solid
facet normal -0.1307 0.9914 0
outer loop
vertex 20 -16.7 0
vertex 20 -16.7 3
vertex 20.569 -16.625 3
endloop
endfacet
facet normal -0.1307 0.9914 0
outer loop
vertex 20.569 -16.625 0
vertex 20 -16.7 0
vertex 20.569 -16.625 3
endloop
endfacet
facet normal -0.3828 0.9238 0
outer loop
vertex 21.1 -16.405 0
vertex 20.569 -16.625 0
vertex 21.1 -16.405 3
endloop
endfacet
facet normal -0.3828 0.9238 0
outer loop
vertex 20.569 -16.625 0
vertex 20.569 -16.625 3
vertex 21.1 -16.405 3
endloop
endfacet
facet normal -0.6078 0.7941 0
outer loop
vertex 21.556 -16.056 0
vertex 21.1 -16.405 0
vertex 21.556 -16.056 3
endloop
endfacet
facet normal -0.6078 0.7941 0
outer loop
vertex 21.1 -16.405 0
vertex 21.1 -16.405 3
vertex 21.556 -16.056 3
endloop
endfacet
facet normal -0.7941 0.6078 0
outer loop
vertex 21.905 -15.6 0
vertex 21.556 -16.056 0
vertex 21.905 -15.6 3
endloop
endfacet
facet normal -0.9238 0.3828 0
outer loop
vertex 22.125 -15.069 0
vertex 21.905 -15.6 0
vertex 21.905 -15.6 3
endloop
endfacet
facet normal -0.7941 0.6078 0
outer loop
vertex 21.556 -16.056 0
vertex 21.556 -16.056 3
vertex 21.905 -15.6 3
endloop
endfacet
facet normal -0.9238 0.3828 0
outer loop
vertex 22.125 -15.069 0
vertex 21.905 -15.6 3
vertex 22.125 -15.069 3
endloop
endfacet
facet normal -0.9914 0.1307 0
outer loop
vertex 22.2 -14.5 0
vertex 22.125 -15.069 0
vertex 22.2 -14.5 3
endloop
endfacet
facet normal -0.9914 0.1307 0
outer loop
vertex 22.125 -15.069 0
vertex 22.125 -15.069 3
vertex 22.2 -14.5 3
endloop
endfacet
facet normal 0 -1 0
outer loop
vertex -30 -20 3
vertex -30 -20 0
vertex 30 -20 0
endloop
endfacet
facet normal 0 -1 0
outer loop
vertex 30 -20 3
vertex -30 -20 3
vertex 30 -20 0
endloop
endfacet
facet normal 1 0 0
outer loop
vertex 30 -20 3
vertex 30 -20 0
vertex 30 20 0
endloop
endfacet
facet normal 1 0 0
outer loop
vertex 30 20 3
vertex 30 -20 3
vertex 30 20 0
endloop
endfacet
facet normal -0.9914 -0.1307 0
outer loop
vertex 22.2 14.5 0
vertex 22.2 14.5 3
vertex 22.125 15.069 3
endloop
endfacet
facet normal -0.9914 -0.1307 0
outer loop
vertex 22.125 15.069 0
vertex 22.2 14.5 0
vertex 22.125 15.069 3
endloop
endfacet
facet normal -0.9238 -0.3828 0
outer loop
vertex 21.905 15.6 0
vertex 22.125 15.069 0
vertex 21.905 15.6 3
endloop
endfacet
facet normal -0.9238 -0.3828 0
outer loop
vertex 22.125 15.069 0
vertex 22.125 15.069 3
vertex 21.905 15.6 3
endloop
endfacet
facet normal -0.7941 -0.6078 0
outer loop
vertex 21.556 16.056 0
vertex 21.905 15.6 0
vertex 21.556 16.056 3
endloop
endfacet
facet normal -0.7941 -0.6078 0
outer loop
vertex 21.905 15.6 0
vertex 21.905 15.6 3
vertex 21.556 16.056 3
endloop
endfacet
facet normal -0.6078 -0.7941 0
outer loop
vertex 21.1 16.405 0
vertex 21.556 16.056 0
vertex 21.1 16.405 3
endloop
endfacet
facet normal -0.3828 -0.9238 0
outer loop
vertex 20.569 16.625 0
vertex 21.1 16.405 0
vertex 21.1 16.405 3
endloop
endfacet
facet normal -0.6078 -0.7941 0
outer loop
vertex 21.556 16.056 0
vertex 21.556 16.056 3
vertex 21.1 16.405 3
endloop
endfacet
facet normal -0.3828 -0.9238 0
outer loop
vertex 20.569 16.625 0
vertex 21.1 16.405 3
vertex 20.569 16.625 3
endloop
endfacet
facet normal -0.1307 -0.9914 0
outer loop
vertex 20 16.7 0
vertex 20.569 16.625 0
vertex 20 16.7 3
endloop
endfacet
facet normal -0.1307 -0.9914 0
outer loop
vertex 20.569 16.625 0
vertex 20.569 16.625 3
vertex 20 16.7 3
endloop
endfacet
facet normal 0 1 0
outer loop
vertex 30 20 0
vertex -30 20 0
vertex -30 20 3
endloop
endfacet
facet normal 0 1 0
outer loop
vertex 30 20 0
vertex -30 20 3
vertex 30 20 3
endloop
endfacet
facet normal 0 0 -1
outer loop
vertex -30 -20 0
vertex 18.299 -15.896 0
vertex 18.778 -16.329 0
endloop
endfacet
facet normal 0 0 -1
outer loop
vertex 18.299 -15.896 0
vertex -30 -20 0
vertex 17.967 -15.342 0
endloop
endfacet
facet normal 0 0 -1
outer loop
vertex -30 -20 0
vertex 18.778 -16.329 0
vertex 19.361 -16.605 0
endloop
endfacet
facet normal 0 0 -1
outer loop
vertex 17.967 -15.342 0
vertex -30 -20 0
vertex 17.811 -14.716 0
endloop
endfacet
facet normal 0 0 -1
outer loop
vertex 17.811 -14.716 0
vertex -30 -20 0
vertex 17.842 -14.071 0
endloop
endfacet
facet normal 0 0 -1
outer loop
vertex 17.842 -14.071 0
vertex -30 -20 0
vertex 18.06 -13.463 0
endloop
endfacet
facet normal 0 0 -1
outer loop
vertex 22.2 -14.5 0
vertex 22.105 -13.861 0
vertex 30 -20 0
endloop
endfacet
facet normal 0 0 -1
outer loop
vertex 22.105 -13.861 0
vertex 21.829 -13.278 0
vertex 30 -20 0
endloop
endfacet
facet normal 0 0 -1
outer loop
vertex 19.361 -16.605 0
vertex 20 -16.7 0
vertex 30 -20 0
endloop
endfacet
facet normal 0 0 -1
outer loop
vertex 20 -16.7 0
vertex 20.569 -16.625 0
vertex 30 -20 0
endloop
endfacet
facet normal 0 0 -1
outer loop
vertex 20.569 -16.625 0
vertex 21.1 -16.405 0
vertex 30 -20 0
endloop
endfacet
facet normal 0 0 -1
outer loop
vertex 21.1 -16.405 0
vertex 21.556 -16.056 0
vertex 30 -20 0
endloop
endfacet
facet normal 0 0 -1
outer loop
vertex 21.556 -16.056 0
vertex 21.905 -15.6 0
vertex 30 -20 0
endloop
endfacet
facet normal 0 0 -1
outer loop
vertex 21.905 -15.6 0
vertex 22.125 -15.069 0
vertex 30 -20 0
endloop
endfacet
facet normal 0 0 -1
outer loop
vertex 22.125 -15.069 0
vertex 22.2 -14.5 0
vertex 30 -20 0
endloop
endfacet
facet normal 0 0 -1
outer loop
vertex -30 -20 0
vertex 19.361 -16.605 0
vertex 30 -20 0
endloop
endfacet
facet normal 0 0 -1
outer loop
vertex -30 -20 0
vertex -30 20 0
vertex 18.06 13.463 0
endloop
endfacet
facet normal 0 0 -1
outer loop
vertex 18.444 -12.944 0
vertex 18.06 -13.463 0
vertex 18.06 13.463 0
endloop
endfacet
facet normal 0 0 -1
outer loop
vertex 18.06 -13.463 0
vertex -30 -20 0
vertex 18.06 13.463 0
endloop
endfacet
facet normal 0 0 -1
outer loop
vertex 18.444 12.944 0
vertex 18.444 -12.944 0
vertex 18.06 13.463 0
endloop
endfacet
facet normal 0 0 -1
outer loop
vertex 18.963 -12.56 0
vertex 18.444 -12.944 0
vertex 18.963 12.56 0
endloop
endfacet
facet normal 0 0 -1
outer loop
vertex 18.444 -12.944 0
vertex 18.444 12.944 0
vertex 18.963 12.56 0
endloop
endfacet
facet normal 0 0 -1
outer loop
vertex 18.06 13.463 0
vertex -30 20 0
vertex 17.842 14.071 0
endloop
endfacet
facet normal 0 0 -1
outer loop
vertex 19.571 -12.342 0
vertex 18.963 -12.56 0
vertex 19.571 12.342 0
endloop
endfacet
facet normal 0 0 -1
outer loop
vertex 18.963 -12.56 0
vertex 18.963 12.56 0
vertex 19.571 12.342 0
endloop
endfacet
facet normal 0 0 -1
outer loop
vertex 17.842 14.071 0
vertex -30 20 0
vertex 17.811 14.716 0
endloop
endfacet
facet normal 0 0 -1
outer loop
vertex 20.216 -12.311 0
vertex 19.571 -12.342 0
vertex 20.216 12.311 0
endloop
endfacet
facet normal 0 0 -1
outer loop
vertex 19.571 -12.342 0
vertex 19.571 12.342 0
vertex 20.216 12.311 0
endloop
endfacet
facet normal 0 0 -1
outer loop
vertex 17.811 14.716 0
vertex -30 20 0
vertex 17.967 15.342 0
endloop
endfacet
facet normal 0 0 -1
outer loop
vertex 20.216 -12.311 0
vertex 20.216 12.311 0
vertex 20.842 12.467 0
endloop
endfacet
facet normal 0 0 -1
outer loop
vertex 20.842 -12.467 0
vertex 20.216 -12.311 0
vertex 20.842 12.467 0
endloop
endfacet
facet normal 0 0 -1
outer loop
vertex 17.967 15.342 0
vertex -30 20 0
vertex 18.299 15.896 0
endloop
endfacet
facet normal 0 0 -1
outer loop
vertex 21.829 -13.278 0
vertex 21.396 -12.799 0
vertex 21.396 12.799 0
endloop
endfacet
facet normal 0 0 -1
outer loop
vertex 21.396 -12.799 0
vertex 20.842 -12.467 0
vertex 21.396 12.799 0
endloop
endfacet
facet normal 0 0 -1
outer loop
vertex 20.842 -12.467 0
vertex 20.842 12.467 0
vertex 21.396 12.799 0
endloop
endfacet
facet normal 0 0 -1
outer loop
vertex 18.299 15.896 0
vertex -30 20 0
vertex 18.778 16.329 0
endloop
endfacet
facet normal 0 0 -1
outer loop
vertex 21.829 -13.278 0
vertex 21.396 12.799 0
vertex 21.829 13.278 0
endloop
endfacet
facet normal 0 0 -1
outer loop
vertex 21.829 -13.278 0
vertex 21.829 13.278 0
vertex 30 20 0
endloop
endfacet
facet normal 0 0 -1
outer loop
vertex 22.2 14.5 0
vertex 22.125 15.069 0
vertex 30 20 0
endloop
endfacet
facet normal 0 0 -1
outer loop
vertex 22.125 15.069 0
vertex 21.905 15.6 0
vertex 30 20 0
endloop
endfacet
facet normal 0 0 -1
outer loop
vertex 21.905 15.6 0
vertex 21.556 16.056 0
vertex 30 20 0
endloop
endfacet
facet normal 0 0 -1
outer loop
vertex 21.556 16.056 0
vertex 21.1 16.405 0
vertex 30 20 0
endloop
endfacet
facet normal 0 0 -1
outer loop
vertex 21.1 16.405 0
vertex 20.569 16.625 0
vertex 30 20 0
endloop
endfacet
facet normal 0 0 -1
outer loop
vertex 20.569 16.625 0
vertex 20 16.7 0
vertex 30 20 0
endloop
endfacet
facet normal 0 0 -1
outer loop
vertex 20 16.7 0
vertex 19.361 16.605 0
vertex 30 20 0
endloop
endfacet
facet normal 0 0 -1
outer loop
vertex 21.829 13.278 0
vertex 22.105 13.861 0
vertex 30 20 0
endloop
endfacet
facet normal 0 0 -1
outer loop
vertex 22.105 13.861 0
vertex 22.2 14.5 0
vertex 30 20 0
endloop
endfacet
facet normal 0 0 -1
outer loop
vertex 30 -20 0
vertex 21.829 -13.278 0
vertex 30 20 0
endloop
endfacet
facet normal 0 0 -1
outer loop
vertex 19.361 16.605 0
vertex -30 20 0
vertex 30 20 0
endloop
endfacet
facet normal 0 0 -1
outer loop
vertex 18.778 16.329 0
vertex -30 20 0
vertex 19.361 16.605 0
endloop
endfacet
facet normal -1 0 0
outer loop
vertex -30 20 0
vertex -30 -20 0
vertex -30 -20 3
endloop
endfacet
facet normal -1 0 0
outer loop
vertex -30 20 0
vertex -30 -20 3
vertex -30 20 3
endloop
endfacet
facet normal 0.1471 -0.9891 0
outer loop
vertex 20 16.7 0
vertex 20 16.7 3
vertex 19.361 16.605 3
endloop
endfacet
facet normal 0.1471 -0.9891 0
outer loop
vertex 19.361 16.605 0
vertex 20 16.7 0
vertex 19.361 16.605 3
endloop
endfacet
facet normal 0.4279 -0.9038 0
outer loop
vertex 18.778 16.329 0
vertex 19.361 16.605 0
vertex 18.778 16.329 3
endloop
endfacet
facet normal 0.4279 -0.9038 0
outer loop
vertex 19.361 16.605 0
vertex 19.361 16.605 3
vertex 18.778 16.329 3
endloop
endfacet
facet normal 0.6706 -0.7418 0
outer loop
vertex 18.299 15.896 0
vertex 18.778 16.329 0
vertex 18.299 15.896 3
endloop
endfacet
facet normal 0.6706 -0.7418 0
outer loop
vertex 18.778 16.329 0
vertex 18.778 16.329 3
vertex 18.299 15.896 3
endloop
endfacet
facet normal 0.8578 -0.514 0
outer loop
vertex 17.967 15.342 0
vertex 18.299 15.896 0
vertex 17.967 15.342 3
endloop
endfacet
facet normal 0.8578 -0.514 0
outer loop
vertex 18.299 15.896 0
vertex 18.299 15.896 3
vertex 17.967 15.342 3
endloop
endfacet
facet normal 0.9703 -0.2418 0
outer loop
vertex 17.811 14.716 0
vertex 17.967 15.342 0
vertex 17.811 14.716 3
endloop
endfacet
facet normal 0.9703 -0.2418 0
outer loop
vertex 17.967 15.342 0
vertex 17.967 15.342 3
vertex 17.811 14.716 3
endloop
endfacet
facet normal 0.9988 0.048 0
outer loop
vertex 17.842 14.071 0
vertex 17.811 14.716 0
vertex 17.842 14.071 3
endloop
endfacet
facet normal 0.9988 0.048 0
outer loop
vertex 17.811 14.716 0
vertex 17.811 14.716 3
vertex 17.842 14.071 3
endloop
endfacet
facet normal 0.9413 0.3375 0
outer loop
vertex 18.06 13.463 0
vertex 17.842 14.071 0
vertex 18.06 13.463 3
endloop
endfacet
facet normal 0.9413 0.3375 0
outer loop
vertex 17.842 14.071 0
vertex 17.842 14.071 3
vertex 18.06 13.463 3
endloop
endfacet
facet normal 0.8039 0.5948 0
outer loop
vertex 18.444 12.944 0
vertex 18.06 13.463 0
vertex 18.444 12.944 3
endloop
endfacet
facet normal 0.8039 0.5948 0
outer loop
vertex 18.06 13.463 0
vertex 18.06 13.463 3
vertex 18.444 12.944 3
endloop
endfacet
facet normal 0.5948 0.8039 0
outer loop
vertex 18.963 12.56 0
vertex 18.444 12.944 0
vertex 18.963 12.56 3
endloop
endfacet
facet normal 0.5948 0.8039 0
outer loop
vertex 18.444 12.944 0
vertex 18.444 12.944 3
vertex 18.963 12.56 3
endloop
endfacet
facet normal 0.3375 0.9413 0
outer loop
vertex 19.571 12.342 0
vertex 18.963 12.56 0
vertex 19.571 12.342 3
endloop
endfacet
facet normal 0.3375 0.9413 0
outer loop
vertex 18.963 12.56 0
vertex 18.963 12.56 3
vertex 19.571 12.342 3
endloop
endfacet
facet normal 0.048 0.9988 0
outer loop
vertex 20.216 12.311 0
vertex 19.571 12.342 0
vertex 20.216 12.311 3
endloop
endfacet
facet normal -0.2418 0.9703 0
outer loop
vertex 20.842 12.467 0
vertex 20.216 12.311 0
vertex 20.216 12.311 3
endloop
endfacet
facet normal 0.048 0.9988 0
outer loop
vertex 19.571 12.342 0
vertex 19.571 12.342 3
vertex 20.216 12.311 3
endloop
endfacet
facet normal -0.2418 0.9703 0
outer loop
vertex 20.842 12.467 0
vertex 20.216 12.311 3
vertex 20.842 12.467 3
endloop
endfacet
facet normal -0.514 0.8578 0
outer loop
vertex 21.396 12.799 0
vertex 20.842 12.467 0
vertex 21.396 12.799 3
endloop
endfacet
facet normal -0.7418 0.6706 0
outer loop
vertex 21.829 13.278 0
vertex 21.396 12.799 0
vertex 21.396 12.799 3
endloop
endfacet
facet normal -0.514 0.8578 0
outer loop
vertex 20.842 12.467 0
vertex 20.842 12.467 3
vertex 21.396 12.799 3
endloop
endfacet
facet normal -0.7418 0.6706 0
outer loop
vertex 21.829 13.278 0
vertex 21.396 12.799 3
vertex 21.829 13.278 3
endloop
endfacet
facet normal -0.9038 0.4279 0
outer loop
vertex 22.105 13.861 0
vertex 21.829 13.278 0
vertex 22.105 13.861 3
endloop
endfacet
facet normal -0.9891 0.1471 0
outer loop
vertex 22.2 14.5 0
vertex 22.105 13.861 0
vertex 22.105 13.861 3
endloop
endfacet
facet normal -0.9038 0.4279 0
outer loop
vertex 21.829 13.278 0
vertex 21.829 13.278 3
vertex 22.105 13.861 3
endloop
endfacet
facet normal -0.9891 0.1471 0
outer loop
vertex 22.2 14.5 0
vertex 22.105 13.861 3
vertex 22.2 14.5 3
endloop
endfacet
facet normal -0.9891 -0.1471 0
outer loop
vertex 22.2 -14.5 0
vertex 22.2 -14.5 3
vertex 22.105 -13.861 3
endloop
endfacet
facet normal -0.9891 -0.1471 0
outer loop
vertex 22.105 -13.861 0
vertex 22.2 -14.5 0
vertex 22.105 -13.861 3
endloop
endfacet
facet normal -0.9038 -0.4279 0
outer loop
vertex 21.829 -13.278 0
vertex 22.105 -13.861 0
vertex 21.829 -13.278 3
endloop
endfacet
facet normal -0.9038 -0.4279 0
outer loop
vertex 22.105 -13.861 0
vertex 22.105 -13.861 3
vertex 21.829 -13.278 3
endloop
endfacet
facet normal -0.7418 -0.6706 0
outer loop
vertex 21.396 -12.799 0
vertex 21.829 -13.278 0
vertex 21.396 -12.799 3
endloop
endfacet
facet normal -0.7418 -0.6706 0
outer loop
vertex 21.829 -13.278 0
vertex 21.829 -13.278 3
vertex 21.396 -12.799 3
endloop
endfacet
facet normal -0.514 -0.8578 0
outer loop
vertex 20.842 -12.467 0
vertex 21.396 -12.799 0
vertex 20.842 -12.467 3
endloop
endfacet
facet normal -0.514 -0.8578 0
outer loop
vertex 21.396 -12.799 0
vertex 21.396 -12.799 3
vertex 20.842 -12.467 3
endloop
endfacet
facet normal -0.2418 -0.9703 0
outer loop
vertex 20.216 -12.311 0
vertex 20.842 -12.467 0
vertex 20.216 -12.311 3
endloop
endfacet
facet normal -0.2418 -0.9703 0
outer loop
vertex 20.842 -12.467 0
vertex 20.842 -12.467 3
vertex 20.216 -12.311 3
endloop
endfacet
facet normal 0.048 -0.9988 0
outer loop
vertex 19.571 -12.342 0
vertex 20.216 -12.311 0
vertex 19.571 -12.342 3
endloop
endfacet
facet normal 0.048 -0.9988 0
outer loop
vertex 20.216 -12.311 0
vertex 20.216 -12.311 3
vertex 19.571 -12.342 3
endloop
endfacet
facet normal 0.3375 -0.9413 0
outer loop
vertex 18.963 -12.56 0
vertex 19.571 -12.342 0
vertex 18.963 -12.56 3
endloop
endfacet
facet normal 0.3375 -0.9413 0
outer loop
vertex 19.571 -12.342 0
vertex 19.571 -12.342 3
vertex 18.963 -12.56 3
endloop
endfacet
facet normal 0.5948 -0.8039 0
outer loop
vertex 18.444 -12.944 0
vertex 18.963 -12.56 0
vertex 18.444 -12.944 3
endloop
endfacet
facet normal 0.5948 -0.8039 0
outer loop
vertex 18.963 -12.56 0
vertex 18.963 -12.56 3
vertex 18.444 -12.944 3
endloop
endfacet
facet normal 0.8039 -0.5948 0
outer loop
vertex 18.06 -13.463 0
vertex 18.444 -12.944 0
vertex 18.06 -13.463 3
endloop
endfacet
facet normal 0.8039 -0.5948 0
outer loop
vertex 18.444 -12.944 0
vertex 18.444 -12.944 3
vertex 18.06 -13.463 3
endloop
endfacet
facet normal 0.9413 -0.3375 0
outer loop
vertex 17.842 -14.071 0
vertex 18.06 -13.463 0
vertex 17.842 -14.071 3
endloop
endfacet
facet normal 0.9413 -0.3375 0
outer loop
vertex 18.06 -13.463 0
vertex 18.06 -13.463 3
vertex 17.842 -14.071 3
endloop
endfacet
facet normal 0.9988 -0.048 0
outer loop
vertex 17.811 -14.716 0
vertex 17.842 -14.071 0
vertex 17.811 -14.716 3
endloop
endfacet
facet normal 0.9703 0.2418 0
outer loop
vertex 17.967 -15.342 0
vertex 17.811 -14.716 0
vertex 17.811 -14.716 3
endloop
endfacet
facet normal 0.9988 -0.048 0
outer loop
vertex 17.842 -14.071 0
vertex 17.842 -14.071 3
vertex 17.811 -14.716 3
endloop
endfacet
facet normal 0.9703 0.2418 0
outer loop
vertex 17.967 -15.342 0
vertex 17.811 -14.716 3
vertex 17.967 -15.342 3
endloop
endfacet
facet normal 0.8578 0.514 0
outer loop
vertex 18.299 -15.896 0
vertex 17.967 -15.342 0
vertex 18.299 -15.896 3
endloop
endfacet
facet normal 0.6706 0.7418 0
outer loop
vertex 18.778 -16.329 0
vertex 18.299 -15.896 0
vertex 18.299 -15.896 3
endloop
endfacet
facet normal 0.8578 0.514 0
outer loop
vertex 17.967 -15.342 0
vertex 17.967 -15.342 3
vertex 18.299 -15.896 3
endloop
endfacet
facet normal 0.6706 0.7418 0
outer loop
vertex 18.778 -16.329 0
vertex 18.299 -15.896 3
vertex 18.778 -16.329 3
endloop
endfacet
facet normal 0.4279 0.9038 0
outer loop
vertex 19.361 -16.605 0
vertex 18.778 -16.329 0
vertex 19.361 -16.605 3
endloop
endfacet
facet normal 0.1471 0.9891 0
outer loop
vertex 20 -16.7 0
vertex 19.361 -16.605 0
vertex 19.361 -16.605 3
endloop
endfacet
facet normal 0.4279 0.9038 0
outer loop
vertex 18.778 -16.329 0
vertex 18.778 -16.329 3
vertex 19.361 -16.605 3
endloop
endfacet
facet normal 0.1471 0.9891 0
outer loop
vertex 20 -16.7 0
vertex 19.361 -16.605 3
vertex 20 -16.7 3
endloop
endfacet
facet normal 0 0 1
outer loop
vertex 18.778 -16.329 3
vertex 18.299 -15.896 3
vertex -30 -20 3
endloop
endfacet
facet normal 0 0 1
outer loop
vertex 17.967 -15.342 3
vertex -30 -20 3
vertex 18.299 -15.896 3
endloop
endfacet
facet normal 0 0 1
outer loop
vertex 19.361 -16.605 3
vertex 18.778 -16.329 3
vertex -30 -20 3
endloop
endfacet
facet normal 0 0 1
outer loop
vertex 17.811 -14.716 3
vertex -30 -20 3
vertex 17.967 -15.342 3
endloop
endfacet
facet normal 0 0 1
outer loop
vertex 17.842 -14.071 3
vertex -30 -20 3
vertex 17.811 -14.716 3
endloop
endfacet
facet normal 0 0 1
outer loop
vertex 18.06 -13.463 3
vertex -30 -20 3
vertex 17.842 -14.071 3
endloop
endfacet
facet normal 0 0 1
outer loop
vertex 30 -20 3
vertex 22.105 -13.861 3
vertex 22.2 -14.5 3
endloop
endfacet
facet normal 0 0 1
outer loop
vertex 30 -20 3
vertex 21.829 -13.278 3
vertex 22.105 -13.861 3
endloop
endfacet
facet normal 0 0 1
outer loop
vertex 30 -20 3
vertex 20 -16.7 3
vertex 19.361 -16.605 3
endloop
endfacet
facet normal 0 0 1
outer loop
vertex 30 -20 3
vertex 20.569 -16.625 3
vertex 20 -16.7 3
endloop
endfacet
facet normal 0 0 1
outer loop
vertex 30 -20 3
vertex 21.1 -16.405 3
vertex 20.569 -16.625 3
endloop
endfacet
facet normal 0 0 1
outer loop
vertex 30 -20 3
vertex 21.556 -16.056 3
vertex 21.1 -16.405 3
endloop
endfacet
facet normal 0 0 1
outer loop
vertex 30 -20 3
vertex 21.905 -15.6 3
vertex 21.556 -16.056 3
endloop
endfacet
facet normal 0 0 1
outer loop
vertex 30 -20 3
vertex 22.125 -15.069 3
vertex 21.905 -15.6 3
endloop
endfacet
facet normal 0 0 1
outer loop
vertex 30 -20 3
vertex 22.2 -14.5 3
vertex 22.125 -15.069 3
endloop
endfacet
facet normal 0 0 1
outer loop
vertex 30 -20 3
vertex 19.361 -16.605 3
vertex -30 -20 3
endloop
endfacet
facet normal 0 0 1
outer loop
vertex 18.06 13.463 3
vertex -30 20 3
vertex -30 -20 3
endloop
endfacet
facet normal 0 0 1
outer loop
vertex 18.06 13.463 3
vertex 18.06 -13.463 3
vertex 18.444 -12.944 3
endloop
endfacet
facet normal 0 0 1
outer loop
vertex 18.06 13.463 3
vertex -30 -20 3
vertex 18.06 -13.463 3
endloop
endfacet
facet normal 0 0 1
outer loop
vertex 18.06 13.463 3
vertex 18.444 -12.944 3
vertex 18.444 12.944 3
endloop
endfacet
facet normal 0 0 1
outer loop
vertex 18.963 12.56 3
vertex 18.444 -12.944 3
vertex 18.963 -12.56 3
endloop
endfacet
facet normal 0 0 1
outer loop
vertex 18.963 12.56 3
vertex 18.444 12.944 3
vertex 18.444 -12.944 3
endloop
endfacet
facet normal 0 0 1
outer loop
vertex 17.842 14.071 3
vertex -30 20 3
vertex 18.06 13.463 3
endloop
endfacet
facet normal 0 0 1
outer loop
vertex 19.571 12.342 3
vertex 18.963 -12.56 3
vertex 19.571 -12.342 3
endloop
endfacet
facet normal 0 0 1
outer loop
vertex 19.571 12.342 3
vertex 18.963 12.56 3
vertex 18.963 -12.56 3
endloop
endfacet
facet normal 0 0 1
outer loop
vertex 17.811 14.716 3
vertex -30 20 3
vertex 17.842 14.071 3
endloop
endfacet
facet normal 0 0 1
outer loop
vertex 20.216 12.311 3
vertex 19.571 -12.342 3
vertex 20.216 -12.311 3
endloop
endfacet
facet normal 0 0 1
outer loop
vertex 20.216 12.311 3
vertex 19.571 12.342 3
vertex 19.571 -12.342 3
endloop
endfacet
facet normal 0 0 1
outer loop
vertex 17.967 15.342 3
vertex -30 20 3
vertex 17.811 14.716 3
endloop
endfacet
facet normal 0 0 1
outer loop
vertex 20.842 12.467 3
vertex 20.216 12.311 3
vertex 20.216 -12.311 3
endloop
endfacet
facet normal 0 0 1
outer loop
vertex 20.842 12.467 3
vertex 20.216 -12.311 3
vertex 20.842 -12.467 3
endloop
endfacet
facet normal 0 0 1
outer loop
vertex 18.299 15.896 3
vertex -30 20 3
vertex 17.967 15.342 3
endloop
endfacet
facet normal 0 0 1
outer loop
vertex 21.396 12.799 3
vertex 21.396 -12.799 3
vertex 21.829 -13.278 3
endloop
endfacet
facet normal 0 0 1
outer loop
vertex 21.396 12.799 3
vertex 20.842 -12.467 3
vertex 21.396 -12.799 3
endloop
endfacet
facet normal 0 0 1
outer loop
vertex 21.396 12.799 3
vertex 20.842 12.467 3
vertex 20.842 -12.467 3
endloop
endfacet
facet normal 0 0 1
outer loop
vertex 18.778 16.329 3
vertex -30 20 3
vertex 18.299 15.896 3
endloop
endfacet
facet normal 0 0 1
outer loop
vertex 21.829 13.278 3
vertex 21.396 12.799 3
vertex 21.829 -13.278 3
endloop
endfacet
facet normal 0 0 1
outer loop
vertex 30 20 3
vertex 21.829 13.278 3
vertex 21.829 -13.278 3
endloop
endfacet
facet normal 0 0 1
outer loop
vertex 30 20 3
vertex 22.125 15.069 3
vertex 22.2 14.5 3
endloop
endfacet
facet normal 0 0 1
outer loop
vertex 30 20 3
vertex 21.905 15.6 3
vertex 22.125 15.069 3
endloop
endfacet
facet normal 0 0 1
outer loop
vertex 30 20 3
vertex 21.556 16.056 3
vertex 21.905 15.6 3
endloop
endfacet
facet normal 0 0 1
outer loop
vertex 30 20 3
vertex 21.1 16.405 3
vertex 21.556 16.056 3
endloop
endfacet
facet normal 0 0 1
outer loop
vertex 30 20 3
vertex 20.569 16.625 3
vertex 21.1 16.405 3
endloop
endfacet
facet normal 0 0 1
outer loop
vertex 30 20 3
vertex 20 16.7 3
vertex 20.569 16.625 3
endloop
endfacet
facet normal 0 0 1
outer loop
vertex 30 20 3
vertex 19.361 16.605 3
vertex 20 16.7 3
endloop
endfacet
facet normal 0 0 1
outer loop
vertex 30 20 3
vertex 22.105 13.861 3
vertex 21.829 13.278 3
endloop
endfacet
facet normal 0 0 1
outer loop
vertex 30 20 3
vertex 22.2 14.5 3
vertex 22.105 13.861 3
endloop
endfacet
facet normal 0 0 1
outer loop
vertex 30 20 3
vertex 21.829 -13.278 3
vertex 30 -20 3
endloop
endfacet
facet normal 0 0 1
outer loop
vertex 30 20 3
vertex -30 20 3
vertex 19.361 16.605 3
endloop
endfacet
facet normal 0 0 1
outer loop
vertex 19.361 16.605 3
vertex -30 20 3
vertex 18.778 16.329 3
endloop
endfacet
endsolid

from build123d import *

# Parameters (mm, degrees)
SKETCH_1_W          = 60
SKETCH_1_H          = 40
EXTRUDE_1_DEPTH     = 3
CUT_EXTRUDE_1_DEPTH = 3


with BuildPart() as part:
    # ｽｹｯﾁ1 → ﾎﾞｽ - 押し出し1 (new body)
    with BuildSketch(Plane.XY):
        Rectangle(SKETCH_1_W, SKETCH_1_H)
    extrude(amount=EXTRUDE_1_DEPTH)

    # ｽｹｯﾁ2 → ｶｯﾄ - 押し出し1 (cut)
    with BuildSketch(Plane.XY.offset(3)):
        with BuildLine():
            ThreePointArc((22.2, 14.5), (21.555634919, 16.055634919), (20, 16.7))
            Line((20, 16.7), (20, 14.5))
            Line((20, 14.5), (22.2, 14.5))
        make_face()
        with BuildLine():
            Line((20, 14.5), (20, 16.7))
            ThreePointArc((20, 16.7), (18.444365081, 12.944365081), (22.2, 14.5))
            Line((22.2, 14.5), (20, 14.5))
        make_face()
        with BuildLine():
            ThreePointArc((22.2, -14.5), (18.444365081, -12.944365081), (20, -16.7))
            Line((20, -16.7), (20, -14.5))
            Line((20, -14.5), (22.2, -14.5))
        make_face()
        with BuildLine():
            Line((20, -14.5), (20, -16.7))
            ThreePointArc((20, -16.7), (21.555634919, -16.055634919), (22.2, -14.5))
            Line((22.2, -14.5), (20, -14.5))
        make_face()
    extrude(amount=-CUT_EXTRUDE_1_DEPTH, mode=Mode.SUBTRACT)


solid = part.part
